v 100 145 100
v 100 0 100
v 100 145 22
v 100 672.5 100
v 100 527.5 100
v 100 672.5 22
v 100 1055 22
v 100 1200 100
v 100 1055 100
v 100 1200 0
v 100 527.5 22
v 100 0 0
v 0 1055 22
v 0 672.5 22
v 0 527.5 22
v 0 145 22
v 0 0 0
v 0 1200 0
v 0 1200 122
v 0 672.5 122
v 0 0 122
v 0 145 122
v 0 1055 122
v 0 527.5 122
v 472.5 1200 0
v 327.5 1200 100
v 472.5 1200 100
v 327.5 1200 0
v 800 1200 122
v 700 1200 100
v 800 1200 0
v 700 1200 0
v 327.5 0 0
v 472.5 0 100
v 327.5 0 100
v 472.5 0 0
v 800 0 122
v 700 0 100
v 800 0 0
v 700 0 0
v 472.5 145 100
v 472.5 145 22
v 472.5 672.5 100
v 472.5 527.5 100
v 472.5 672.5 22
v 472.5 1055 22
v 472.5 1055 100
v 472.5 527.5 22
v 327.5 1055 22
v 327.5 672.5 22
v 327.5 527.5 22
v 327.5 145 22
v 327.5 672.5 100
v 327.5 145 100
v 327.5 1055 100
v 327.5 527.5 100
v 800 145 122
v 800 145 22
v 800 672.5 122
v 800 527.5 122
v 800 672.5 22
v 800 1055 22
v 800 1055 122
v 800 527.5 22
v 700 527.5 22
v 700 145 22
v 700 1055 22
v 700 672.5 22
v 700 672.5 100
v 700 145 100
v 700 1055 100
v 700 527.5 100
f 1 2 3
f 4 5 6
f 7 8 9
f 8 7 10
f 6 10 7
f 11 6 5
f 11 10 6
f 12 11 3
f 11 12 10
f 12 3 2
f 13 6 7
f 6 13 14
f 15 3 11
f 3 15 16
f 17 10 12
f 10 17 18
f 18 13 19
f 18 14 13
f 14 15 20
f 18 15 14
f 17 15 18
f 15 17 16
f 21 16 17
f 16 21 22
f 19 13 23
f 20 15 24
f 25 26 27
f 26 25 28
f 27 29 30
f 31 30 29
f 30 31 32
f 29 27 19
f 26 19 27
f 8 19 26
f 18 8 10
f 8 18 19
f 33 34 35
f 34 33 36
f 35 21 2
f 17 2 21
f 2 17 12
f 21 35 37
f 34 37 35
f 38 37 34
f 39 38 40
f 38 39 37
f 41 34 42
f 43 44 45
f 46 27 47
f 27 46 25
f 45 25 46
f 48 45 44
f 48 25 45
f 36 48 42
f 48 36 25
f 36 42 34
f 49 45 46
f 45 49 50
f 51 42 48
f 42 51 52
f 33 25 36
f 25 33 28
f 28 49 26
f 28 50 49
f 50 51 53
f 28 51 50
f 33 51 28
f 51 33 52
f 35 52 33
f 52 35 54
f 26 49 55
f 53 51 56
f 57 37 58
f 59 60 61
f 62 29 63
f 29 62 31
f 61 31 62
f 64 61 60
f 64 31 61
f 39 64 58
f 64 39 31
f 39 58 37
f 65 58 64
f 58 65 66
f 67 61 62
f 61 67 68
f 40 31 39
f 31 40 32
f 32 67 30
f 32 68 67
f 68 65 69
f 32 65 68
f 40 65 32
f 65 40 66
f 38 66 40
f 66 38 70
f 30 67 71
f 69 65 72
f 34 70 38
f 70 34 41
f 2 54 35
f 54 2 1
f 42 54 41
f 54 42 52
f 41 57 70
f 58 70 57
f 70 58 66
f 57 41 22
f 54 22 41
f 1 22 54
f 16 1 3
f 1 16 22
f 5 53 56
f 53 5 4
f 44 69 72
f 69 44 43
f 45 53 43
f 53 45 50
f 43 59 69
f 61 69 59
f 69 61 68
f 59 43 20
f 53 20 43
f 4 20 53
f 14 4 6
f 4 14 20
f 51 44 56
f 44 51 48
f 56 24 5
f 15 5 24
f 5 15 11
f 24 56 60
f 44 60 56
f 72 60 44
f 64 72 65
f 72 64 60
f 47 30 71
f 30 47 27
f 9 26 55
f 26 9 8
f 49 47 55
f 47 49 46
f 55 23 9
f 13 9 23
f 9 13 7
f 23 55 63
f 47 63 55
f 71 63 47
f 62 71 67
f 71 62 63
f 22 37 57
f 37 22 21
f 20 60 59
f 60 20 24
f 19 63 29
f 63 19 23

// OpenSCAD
//Europallet

/*---------------------------
Global variables
---------------------------*/
// General pallet dimensions
pallet_width=800;
pallet_length=1200;
pallet_height=144;
plank_height=22;

// Top layer elements
top_gap_small=40;
top_gap_wide=42.5;

top_plank_small_width=100;
top_plank_small_length=pallet_length;
top_plank_small_height=plank_height;
top_plank_wide_width=145;
top_plank_wide_length=pallet_length;
top_plank_wide_height=plank_height;

// Second layer elements
under_top_plank_width=145;
under_top_plank_length=pallet_width;
under_top_plank_height=plank_height;
under_top_layer_height=under_top_plank_height;

// Third layer elements
block_length=145;
block_height=78;
side_block_width=100;
side_block_length=block_length;
side_block_height=block_height;
center_block_width=145;
center_block_length=block_length;
center_block_height=block_height;
block_width_gap=227.5;
block_length_gap=382.5;
block_layer_height=block_height;

// Bottom layer elements
bottom_center_plank_width=center_block_width;
bottom_center_plank_length=pallet_length;
bottom_center_plank_height=plank_height;
bottom_side_plank_width=side_block_width;
bottom_side_plank_length=pallet_length;
bottom_side_plank_height=plank_height;
bottom_plank_gap=227.5;
bottom_layer_height=plank_height;

// Generate the elements
// bottom layer
module bottom_side_plank(){
    cube([bottom_side_plank_width,bottom_side_plank_length,bottom_side_plank_height]);
}

module bottom_center_plank(){
    cube([bottom_center_plank_width,bottom_center_plank_length,bottom_center_plank_height]);
}
// block layer
module center_block(){
    cube([center_block_width,center_block_length,center_block_height]);
}
module side_block(){
    cube([side_block_width,side_block_length,side_block_height]);
}
module under_top_plank(){
    cube([under_top_plank_width, under_top_plank_length,under_top_plank_height]);
}
// top layer
module top_plank_wide(){
    cube([top_plank_wide_width,top_plank_wide_length,top_plank_wide_height]);
}
module top_plank_small(){
    cube([top_plank_small_width,top_plank_small_length,top_plank_small_height]);
}
// Generate the layers
module bottom_layer(){
    bottom_side_plank();
    translate([(pallet_width-bottom_center_plank_width)/2,0,0])bottom_center_plank();
    translate([pallet_width-bottom_side_plank_width,0,0]) bottom_side_plank();
}

module block_layer(){
    translate([0,0,bottom_layer_height]) side_block();
    translate([0,(pallet_length-side_block_length)/2,bottom_layer_height]) side_block();
    translate([0,(pallet_length-side_block_length),bottom_layer_height]) side_block();
    translate([(pallet_width-center_block_width)/2,0,bottom_layer_height]) center_block();
    translate([(pallet_width-center_block_width)/2,(pallet_length-center_block_length)/2,bottom_layer_height]) center_block();
    translate([(pallet_width-center_block_width)/2,(pallet_length-center_block_length),bottom_layer_height]) center_block();
    translate([pallet_width-side_block_width,0,bottom_layer_height]) side_block();
    translate([pallet_width-side_block_width,(pallet_length-side_block_length)/2,bottom_layer_height]) side_block();
    translate([pallet_width-side_block_width,(pallet_length-side_block_length),bottom_layer_height]) side_block();
}
module under_top_layer(){
    translate([under_top_plank_length,0,bottom_layer_height+block_layer_height])
        rotate([0,0,90])
            under_top_plank();
    translate([under_top_plank_length,(pallet_length-under_top_plank_width)/2,bottom_layer_height+block_layer_height])
        rotate([0,0,90])
            under_top_plank();
    translate([under_top_plank_length,pallet_length-under_top_plank_width,bottom_layer_height+block_layer_height])
        rotate([0,0,90])
            under_top_plank();
}
module top_layer(){
    translate([0,0,bottom_layer_height+block_layer_height+under_top_layer_height]) top_plank_wide();
    translate([top_plank_wide_width+top_gap_wide,0,bottom_layer_height+block_layer_height+under_top_layer_height]) top_plank_small();
    translate([(pallet_width-top_plank_wide_width)/2,0,bottom_layer_height+block_layer_height+under_top_layer_height])
        top_plank_wide();
    translate([pallet_width-top_plank_wide_width-top_gap_wide-top_plank_small_width,0,bottom_layer_height+block_layer_height+under_top_layer_height]) top_plank_small();
    translate([pallet_width-top_plank_wide_width,0,bottom_layer_height+block_layer_height+under_top_layer_height])
        top_plank_wide();
}
// Generate the pallet
bottom_layer();
block_layer();
under_top_layer();
